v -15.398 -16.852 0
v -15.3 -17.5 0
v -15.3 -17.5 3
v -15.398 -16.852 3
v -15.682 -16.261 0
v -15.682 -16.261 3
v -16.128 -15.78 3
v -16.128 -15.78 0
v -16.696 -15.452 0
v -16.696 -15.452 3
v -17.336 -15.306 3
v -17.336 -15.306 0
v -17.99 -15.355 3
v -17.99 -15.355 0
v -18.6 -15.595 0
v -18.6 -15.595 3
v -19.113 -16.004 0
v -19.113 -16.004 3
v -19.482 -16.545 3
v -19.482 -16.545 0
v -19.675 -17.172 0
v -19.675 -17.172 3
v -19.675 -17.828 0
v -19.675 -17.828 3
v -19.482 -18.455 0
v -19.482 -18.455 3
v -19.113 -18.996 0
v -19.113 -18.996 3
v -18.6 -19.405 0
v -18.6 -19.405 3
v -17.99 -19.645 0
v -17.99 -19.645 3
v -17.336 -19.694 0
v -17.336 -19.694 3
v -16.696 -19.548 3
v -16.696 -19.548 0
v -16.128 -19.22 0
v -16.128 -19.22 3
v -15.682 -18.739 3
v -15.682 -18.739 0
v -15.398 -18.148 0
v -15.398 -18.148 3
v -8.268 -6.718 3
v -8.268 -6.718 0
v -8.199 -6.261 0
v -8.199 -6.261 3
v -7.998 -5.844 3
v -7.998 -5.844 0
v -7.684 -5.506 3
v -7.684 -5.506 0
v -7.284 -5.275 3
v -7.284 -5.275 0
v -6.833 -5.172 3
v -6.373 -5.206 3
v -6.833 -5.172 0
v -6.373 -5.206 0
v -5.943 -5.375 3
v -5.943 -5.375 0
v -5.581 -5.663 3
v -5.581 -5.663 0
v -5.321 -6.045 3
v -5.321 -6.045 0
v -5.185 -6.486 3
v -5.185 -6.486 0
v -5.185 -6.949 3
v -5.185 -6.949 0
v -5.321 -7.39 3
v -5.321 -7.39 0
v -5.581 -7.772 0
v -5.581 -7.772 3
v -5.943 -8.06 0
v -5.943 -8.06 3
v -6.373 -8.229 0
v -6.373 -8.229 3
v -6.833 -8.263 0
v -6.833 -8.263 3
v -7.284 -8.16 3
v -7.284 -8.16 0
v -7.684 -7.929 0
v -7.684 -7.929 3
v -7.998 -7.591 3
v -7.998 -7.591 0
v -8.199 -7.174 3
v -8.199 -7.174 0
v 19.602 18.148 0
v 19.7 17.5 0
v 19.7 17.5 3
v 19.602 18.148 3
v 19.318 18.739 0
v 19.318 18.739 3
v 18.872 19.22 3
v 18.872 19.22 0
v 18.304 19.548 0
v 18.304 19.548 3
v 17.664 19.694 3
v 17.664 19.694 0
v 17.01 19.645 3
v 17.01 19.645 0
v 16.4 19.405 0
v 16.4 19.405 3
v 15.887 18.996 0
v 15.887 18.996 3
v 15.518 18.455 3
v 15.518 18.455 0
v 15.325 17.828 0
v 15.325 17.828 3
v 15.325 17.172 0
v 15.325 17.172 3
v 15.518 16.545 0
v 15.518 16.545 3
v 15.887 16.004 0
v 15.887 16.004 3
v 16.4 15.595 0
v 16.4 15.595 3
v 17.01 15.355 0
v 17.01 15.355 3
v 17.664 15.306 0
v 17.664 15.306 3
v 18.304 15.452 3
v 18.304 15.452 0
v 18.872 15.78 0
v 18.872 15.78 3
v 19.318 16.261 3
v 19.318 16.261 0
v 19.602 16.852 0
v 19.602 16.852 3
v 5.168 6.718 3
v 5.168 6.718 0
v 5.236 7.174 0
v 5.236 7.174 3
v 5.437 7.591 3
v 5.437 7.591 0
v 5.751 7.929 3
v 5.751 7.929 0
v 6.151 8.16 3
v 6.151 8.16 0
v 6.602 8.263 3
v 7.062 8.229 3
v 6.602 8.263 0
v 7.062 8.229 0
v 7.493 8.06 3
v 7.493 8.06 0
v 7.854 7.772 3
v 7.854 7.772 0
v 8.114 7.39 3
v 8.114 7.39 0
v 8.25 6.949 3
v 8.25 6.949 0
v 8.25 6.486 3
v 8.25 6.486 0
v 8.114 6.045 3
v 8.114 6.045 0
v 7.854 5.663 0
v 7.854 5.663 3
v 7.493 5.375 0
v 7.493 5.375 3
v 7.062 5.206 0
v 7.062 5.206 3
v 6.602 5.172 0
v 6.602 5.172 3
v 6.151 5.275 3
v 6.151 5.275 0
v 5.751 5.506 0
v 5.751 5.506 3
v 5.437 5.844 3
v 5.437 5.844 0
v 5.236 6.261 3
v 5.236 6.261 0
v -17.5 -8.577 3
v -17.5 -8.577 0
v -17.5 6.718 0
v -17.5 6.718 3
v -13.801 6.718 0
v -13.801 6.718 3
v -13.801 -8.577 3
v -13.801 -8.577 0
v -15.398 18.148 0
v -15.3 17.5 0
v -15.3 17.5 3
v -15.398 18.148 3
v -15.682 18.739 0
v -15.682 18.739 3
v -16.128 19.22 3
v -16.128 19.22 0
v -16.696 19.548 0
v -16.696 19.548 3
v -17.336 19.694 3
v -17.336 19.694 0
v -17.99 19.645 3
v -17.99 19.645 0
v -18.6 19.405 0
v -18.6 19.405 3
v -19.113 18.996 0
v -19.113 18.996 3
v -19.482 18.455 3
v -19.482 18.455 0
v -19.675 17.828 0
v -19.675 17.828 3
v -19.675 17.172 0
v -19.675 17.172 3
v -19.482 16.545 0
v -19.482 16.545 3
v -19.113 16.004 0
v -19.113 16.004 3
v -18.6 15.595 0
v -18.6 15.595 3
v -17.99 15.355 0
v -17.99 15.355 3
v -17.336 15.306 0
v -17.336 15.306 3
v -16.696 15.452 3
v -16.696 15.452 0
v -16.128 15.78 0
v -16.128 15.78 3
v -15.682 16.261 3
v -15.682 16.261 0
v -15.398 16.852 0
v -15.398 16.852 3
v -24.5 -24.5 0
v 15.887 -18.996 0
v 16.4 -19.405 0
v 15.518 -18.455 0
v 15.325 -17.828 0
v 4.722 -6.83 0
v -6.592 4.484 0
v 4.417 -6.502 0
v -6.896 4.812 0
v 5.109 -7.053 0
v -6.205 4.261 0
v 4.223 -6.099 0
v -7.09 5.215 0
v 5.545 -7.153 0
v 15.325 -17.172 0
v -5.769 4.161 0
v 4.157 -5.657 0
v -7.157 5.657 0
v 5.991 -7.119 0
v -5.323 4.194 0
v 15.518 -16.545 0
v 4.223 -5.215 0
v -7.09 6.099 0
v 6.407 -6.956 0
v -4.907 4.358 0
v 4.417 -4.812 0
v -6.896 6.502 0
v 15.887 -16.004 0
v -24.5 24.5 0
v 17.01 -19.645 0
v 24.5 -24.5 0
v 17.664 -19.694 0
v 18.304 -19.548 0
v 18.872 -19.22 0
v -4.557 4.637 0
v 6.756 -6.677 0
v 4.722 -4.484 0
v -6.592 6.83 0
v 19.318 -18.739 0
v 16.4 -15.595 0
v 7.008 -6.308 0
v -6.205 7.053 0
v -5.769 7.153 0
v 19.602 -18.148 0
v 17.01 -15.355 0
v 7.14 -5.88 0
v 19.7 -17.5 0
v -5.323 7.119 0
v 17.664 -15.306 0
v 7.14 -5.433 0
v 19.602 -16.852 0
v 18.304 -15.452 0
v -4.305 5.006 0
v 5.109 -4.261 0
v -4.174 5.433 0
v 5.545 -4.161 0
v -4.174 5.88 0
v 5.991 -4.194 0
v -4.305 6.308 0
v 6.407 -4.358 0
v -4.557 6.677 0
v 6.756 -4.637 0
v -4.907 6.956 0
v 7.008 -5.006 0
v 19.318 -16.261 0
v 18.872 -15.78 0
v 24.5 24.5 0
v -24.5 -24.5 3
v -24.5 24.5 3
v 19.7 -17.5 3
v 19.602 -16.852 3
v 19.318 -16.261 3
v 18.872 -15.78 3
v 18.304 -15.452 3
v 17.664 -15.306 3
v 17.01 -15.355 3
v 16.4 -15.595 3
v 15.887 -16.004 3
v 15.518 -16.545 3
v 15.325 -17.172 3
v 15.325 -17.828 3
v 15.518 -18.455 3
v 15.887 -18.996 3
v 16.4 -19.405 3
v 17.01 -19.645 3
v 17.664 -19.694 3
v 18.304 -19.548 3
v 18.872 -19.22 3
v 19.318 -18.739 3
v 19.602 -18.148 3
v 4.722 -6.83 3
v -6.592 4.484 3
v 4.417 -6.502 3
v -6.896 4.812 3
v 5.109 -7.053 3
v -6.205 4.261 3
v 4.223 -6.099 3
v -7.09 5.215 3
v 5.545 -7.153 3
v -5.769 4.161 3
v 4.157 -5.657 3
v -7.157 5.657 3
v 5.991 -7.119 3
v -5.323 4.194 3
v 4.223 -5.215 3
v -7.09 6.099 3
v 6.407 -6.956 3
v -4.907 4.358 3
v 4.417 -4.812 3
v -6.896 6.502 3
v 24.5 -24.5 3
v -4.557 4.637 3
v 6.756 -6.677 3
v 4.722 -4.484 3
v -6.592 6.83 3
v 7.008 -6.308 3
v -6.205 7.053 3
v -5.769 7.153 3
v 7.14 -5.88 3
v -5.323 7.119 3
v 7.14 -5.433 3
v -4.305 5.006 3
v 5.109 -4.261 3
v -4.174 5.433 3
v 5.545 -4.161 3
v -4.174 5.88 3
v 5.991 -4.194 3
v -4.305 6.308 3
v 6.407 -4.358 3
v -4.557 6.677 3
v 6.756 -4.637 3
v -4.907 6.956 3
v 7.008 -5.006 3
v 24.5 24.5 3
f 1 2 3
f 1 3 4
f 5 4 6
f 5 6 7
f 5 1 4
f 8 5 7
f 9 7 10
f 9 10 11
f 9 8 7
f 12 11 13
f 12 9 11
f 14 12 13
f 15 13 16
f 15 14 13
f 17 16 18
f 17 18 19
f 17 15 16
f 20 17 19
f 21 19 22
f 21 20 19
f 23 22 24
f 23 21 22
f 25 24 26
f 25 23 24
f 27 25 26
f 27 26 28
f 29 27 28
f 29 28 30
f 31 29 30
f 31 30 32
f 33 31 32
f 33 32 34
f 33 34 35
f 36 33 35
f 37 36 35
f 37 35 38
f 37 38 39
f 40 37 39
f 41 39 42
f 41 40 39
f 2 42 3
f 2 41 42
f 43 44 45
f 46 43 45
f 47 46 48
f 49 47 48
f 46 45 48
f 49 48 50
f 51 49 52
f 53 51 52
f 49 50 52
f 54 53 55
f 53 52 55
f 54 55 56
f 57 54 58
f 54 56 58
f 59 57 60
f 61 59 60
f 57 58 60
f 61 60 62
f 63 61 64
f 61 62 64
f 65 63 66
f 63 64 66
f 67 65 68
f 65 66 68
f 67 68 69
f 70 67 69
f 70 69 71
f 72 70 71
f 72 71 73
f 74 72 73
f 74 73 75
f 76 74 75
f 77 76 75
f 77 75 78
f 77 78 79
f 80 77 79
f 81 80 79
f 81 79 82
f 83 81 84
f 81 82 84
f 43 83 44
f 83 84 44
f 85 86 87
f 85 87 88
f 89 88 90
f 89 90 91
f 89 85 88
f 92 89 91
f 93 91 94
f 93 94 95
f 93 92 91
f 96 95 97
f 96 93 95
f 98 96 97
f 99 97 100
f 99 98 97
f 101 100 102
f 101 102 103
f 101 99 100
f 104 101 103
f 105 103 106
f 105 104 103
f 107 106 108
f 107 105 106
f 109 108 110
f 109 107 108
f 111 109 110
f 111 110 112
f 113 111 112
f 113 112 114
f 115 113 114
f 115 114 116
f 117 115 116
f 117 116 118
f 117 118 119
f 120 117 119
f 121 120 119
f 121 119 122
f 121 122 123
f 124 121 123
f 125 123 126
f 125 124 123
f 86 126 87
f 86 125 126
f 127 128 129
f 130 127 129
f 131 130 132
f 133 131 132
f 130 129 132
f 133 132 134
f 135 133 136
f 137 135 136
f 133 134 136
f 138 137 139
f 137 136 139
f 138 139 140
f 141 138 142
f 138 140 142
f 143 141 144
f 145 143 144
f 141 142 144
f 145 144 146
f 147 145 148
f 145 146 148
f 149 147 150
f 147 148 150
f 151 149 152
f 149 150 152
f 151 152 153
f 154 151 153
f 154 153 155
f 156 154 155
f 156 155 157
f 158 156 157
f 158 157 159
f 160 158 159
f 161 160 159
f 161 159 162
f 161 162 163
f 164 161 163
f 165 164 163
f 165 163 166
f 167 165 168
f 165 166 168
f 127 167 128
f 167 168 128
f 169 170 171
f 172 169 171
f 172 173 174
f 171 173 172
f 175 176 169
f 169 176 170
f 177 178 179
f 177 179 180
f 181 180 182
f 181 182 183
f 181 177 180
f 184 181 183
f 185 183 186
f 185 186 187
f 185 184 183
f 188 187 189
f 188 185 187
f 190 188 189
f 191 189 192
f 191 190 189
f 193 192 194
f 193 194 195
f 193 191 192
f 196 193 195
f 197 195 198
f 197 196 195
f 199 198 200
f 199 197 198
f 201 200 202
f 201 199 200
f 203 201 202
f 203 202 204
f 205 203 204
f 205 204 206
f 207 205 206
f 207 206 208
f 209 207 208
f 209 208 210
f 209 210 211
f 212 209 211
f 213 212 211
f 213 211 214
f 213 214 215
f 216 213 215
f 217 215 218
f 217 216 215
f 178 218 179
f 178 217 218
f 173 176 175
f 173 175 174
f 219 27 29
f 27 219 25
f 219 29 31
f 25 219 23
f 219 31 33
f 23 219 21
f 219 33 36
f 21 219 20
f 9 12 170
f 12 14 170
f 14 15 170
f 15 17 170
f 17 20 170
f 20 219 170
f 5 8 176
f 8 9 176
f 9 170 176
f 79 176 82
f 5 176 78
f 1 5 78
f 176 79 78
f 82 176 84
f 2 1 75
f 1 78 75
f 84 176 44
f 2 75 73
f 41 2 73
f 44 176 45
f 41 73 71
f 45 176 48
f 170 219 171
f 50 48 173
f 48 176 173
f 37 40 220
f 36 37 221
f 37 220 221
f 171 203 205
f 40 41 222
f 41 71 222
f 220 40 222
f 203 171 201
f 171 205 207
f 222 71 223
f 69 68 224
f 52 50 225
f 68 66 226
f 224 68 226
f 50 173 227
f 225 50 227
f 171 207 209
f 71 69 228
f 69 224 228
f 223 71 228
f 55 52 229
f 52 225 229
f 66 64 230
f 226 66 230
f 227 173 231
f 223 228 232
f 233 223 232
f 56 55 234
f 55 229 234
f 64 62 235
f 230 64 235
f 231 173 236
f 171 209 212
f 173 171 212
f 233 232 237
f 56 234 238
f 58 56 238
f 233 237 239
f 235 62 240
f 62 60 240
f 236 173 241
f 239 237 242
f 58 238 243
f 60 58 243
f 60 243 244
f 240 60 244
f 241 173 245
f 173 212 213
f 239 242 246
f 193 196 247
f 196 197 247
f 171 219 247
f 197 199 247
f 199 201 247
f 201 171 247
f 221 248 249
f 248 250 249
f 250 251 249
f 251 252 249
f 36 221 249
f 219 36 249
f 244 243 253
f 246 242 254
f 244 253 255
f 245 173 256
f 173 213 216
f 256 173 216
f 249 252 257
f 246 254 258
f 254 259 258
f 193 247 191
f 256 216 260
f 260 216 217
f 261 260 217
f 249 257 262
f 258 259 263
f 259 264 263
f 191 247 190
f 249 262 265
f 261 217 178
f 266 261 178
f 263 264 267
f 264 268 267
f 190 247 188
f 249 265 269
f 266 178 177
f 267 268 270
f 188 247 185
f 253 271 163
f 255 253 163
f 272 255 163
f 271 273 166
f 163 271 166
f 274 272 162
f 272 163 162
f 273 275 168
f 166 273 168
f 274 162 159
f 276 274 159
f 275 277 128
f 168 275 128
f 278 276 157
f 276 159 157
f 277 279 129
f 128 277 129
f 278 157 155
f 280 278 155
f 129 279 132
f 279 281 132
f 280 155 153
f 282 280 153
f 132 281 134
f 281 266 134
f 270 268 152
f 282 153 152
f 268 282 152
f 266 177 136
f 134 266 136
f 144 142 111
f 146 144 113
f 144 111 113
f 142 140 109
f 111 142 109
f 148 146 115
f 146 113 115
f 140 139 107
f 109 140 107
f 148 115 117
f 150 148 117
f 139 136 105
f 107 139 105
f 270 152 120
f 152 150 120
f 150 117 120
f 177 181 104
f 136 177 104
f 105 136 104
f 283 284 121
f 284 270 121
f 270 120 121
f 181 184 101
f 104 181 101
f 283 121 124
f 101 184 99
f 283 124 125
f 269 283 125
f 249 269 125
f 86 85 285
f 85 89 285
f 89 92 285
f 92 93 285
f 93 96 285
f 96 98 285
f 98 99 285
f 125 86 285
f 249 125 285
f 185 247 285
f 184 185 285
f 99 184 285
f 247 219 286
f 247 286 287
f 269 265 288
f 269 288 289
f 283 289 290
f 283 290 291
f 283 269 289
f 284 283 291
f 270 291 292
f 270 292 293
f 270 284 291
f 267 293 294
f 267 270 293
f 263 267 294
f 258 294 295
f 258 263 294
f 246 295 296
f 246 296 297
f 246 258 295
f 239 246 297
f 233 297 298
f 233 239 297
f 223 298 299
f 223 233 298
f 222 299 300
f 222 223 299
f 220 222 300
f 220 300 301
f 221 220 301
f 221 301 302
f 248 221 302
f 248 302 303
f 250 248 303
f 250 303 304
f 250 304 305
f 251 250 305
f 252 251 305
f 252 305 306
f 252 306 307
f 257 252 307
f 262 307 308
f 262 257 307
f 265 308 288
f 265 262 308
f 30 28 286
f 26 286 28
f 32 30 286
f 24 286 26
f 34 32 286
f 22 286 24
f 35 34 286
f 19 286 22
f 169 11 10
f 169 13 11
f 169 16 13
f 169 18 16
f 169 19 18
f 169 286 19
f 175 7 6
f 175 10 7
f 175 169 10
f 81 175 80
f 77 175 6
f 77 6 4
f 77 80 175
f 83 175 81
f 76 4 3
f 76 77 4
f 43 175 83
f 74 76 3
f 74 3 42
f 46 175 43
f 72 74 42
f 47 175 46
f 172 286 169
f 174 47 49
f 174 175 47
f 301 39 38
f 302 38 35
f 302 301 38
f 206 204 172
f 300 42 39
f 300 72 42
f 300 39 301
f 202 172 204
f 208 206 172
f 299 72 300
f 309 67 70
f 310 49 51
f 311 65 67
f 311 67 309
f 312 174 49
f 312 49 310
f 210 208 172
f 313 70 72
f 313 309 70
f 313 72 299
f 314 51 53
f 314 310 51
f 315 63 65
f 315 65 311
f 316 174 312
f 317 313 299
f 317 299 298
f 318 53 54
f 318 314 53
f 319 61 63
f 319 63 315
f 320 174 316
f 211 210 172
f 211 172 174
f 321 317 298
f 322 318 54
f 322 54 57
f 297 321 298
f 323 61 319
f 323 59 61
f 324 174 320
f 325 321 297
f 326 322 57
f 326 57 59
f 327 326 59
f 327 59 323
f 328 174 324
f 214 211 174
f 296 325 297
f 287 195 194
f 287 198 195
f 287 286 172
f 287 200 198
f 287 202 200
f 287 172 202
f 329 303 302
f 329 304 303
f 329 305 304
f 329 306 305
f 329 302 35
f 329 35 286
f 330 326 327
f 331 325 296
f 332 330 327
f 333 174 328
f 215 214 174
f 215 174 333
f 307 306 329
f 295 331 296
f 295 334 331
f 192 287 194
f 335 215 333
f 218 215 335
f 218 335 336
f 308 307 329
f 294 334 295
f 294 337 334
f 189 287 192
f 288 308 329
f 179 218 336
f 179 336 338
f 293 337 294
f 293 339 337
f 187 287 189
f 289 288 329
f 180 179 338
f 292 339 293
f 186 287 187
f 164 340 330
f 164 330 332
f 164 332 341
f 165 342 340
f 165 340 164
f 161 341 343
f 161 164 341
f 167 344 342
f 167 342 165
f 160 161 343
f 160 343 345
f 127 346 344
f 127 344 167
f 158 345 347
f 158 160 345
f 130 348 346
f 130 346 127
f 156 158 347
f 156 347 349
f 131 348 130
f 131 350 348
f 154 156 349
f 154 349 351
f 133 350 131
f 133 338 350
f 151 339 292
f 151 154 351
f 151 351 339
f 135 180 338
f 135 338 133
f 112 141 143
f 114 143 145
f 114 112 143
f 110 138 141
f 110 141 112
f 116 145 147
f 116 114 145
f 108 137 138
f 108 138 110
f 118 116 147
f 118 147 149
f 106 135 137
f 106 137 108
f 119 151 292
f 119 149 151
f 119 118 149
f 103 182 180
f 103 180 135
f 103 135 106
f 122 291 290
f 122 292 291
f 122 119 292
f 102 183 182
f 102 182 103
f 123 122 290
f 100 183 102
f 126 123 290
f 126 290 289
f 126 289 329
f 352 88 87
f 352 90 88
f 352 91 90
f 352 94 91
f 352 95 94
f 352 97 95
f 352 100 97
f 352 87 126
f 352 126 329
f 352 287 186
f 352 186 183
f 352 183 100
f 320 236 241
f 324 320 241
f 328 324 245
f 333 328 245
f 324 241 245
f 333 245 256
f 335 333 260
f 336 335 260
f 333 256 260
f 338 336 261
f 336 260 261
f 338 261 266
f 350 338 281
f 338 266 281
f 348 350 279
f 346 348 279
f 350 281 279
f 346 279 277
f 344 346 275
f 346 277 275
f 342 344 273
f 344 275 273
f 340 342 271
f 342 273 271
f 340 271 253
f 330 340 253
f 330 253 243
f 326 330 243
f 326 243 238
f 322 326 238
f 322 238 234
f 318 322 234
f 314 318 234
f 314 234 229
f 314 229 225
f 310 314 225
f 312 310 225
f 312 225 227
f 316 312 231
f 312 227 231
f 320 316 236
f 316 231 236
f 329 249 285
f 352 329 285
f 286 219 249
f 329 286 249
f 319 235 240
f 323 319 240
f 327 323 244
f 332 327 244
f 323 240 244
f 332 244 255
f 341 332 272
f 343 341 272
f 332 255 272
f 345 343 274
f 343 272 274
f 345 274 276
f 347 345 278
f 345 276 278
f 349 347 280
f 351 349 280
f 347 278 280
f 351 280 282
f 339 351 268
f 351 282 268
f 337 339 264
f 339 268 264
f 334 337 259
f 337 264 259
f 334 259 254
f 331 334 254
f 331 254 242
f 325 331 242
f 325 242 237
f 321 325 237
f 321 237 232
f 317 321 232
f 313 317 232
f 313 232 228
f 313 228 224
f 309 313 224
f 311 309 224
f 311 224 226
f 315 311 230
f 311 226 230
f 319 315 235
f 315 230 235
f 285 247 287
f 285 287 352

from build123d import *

# Parameters (mm, degrees)
SKETCH1_W           = 49
SKETCH1_H           = 49
SKETCH1_R           = 2.2
BOSS_EXTRUDE1_DEPTH = 3
SKETCH2_R           = 1.55
SKETCH2_R_2         = 1.5
SKETCH2_W           = 3.699471197
SKETCH2_H           = 15.29419199
CUT_EXTRUDE1_DEPTH  = 3


with BuildPart() as part:
    # Sketch1 → Boss-Extrude1 (new body)
    with BuildSketch(Plane.XY):
        Rectangle(SKETCH1_W, SKETCH1_H)
        with Locations((-17.5, -17.5)):
            Circle(SKETCH1_R, mode=Mode.SUBTRACT)
        with Locations((17.5, 17.5)):
            Circle(SKETCH1_R, mode=Mode.SUBTRACT)
        with Locations((17.5, -17.5)):
            Circle(SKETCH1_R, mode=Mode.SUBTRACT)
        with Locations((-17.5, 17.5)):
            Circle(SKETCH1_R, mode=Mode.SUBTRACT)
    extrude(amount=BOSS_EXTRUDE1_DEPTH)

    # Sketch2 → Cut-Extrude1 (cut)
    with BuildSketch(Plane(origin=(0, 0, 0), x_dir=(-1, 0, 0), z_dir=(0, 0, -1))):
        with Locations((-6.717514421, 6.717514421)):
            Circle(SKETCH2_R)
        with Locations((5.656854249, 5.656854249)):
            Circle(SKETCH2_R_2)
        with Locations((6.717514421, -6.717514421)):
            Circle(SKETCH2_R)
        with Locations((-5.656854249, -5.656854249)):
            Circle(SKETCH2_R_2)
        with Locations((15.650264401, -0.929581574)):
            Rectangle(SKETCH2_W, SKETCH2_H)
    extrude(amount=-CUT_EXTRUDE1_DEPTH, mode=Mode.SUBTRACT)


solid = part.part
